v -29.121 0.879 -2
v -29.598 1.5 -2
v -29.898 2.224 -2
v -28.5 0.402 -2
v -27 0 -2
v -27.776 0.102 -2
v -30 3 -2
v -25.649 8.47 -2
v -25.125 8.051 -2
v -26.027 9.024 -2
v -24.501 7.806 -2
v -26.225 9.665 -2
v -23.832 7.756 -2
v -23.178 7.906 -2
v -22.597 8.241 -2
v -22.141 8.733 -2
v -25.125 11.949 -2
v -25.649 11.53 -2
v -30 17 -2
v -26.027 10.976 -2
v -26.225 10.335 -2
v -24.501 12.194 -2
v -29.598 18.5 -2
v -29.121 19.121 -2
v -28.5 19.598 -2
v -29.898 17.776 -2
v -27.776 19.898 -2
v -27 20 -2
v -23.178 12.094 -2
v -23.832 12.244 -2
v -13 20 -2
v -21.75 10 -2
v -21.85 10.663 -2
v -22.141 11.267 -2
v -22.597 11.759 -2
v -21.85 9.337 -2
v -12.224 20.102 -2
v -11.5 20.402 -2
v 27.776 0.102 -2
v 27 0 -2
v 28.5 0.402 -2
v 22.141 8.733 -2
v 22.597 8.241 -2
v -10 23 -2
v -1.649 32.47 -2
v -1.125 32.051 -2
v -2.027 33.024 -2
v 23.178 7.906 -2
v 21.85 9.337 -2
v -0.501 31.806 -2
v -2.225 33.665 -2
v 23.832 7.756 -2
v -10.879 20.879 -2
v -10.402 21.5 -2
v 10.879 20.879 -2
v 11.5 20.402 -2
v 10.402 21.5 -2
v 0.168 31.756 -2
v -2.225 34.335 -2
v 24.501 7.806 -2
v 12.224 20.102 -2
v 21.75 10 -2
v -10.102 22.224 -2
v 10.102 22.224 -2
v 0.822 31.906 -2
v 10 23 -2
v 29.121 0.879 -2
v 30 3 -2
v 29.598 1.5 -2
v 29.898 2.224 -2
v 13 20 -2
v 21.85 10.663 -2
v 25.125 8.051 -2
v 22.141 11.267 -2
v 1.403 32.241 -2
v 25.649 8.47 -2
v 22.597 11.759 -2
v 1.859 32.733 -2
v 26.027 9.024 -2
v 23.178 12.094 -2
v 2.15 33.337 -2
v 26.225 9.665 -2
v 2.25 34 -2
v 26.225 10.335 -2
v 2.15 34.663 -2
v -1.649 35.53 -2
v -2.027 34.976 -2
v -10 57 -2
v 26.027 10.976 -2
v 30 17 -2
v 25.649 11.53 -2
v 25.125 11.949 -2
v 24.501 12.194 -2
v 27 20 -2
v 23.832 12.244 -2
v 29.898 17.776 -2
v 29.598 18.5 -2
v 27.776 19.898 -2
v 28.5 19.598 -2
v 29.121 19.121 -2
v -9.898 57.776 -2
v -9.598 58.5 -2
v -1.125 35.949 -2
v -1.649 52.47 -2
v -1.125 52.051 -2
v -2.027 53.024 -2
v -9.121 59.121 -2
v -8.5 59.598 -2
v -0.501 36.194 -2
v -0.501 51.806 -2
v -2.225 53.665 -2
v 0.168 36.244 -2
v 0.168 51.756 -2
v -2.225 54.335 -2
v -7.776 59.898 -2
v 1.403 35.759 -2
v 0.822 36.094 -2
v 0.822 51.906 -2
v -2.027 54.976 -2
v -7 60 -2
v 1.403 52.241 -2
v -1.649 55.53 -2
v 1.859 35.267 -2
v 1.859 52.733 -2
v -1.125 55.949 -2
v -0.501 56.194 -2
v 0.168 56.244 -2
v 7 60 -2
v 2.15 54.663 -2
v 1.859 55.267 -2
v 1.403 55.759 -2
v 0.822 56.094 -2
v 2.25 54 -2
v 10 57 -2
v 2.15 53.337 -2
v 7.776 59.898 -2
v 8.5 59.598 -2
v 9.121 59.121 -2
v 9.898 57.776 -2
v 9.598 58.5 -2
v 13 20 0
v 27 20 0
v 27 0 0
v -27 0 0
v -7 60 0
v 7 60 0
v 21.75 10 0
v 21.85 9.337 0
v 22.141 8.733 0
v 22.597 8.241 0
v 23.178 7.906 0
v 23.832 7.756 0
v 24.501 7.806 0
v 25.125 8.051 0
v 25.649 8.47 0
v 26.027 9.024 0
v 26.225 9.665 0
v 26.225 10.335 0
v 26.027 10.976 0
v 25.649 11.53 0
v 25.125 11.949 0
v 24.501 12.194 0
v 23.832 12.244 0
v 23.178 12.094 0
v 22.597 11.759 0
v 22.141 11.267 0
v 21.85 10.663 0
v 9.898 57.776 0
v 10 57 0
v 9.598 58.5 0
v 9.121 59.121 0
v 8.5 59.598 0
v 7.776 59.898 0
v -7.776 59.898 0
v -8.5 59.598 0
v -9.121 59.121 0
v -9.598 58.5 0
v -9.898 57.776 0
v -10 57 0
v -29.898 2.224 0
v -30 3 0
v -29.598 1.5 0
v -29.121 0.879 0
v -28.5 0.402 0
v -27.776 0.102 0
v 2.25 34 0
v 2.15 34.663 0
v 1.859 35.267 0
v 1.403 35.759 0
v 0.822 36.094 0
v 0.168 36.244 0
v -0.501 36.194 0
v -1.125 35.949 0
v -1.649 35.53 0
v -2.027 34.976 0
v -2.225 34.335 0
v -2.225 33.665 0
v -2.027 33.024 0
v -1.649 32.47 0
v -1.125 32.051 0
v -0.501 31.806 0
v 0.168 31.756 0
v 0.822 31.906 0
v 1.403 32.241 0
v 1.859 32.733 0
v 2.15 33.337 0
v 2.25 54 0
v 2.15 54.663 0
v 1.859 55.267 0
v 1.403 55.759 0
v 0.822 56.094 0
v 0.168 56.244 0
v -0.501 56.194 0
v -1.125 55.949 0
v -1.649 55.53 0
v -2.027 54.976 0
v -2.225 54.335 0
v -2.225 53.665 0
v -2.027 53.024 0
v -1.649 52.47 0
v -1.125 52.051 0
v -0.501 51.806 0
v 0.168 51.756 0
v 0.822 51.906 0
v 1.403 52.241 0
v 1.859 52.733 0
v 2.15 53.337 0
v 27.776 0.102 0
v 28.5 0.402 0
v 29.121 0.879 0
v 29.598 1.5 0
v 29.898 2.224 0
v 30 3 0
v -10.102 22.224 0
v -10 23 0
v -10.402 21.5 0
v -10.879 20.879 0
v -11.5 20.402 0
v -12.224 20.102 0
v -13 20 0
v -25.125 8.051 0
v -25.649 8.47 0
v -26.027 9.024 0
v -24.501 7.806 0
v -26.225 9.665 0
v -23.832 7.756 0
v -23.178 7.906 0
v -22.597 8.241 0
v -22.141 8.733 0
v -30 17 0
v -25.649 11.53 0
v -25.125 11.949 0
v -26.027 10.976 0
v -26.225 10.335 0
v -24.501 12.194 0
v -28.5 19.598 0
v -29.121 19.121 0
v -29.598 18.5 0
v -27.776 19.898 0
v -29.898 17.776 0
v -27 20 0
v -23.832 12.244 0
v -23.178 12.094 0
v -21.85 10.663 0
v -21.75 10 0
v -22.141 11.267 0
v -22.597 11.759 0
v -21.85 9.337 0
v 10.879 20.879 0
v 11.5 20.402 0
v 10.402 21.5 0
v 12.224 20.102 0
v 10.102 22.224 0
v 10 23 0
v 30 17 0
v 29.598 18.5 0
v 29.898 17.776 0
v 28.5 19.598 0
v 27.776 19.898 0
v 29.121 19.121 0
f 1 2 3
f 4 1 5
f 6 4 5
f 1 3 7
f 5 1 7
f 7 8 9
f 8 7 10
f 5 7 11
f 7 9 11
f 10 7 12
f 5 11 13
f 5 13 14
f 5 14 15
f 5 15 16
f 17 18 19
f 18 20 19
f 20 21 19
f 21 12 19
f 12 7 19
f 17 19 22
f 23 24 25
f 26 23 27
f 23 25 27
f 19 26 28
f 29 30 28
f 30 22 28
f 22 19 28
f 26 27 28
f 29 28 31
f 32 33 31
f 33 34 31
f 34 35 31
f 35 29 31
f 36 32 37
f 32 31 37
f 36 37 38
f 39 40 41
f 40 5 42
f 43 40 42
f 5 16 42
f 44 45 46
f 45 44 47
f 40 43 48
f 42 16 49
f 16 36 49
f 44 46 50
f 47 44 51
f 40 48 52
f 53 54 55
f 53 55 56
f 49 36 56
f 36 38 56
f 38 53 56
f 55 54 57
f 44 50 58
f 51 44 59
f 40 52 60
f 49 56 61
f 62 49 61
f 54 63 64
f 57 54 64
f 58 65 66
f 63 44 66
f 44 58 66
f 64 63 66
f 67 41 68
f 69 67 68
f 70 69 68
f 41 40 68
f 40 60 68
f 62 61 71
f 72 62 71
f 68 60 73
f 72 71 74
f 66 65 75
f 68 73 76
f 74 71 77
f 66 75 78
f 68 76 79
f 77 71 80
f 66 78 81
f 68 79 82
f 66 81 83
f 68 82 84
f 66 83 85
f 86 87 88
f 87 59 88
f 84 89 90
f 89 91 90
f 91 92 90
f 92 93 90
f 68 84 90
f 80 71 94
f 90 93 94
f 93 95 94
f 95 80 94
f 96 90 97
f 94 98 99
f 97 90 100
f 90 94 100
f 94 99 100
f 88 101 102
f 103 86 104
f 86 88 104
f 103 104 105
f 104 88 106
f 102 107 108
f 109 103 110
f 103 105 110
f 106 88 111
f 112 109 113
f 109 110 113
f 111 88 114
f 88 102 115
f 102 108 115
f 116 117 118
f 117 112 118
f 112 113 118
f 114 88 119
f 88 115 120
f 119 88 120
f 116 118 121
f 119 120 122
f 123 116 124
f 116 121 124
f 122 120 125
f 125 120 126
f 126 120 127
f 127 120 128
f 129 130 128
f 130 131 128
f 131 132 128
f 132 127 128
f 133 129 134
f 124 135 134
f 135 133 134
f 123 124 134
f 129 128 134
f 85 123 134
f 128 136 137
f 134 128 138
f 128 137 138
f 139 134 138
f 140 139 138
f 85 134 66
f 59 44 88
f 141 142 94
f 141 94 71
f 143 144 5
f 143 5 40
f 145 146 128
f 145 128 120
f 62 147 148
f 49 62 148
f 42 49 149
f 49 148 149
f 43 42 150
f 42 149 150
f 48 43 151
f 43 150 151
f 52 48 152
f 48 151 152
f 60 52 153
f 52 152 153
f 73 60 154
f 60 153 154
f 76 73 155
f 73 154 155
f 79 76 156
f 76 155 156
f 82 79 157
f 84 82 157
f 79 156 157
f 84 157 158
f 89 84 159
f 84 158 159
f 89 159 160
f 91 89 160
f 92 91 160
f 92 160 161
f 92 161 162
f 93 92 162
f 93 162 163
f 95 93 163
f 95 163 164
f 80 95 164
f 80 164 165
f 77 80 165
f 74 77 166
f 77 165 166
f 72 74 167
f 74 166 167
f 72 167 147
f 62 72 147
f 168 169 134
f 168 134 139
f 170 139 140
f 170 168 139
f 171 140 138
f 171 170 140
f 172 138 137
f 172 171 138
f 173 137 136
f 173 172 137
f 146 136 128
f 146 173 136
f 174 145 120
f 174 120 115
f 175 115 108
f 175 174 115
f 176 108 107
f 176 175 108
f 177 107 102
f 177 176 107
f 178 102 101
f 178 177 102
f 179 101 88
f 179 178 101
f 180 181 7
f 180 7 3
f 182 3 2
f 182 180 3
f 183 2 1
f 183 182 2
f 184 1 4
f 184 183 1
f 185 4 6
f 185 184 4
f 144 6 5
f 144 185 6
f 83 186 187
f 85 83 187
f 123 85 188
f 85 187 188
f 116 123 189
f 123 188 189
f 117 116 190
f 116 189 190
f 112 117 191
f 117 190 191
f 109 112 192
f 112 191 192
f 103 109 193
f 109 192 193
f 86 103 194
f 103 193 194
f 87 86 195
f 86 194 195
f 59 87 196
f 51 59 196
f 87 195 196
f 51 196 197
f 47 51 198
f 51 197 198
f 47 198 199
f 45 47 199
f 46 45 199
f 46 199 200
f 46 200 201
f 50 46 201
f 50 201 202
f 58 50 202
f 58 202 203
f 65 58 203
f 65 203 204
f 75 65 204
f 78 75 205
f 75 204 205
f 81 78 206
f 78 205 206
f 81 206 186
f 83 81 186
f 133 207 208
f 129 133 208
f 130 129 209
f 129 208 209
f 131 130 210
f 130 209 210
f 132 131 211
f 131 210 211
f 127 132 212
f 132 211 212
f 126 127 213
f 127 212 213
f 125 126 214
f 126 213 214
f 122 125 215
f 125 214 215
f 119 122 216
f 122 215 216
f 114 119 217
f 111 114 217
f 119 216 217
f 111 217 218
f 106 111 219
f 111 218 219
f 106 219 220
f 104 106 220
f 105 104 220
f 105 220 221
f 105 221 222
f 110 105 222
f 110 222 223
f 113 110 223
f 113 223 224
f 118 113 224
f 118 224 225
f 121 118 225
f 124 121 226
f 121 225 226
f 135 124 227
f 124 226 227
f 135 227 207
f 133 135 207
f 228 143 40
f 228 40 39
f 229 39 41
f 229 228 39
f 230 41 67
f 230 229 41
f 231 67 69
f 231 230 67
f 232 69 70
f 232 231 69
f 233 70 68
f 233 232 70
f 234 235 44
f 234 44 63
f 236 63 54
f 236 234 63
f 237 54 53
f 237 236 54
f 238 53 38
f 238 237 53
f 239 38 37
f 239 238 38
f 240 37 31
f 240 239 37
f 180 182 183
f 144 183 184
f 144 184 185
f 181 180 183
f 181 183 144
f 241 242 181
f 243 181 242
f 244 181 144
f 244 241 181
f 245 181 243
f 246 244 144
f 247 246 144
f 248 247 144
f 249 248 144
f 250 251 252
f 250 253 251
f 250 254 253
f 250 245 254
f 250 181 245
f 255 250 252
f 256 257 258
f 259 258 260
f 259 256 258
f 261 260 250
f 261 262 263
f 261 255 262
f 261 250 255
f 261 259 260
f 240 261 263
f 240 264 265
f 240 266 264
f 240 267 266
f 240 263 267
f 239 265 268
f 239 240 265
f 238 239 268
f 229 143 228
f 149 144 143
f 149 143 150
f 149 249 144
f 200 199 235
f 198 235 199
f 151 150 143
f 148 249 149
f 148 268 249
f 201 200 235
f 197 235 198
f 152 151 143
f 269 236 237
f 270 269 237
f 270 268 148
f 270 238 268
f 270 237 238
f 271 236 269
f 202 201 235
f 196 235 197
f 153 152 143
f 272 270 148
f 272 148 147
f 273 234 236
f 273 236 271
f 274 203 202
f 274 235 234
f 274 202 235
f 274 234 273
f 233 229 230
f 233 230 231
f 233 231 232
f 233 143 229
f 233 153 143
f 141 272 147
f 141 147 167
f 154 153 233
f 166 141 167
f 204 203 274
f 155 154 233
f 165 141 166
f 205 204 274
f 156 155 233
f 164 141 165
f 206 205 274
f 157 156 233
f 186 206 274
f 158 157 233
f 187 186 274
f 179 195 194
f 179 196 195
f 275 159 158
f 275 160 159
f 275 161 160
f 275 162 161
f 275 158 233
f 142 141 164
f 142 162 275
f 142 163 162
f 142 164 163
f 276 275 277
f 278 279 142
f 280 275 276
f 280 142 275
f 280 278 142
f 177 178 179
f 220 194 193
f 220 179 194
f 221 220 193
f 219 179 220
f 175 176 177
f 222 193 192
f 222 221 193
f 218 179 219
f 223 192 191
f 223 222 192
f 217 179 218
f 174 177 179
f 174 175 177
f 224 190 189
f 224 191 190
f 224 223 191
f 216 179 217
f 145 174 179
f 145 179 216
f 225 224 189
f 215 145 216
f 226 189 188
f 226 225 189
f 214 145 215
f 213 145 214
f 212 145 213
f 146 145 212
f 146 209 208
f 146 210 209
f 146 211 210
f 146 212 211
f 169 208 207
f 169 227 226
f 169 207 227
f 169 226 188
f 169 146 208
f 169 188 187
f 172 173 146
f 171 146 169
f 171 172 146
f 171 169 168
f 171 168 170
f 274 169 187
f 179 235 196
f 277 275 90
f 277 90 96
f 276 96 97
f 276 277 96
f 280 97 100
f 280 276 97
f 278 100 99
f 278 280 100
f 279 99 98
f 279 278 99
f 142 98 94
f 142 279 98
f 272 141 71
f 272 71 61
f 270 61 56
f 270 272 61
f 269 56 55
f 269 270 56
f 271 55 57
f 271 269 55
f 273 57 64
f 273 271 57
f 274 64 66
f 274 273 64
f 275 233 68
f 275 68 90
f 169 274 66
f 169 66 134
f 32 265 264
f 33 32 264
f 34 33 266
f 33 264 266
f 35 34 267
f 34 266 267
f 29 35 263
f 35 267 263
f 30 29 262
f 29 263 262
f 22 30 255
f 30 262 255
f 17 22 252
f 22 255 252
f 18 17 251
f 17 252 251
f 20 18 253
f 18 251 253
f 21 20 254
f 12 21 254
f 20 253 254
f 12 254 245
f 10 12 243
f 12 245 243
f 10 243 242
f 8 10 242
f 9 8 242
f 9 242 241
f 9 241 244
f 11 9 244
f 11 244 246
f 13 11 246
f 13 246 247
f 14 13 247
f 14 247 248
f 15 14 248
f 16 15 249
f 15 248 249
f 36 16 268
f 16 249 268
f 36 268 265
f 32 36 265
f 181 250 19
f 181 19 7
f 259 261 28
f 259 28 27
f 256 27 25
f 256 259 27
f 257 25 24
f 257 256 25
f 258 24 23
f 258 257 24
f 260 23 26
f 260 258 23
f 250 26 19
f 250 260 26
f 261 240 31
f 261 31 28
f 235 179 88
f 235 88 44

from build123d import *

# Parameters (mm, degrees)
SKETCH_1_R             = 2.25
SM_BASE_FLANGE_1_DEPTH = 2


# Sheet-metal steps are written as plain solids
with BuildPart() as part:
    # Sketch 1 → 基体-法兰1 (new body)
    with BuildSketch(Plane.XY):
        with BuildLine():
            Line((-27, 0), (27, 0))
            ThreePointArc((27, 0), (29.121320344, 0.878679656), (30, 3))
            Line((30, 3), (30, 17))
            ThreePointArc((30, 17), (29.121320344, 19.121320344), (27, 20))
            Line((27, 20), (13, 20))
            ThreePointArc((13, 20), (10.878679656, 20.878679656), (10, 23))
            Line((10, 23), (10, 32.5))
            Line((10, 32.5), (10, 57))
            ThreePointArc((10, 57), (9.121320344, 59.121320344), (7, 60))
            Line((7, 60), (-7, 60))
            ThreePointArc((-7, 60), (-9.121320344, 59.121320344), (-10, 57))
            Line((-10, 57), (-10, 23))
            ThreePointArc((-10, 23), (-10.878679656, 20.878679656), (-13, 20))
            Line((-13, 20), (-27, 20))
            ThreePointArc((-27, 20), (-29.121320344, 19.121320344), (-30, 17))
            Line((-30, 17), (-30, 3))
            ThreePointArc((-30, 3), (-29.121320344, 0.878679656), (-27, 0))
        make_face()
        with Locations((-24, 10)):
            Circle(SKETCH_1_R, mode=Mode.SUBTRACT)
        with Locations(Location((24, 10, 0), (0, 0, 180))):
            Circle(SKETCH_1_R, mode=Mode.SUBTRACT)
        with Locations((0, 54)):
            Circle(SKETCH_1_R, mode=Mode.SUBTRACT)
        with Locations((0, 34)):
            Circle(SKETCH_1_R, mode=Mode.SUBTRACT)
    extrude(amount=-SM_BASE_FLANGE_1_DEPTH)


solid = part.part
